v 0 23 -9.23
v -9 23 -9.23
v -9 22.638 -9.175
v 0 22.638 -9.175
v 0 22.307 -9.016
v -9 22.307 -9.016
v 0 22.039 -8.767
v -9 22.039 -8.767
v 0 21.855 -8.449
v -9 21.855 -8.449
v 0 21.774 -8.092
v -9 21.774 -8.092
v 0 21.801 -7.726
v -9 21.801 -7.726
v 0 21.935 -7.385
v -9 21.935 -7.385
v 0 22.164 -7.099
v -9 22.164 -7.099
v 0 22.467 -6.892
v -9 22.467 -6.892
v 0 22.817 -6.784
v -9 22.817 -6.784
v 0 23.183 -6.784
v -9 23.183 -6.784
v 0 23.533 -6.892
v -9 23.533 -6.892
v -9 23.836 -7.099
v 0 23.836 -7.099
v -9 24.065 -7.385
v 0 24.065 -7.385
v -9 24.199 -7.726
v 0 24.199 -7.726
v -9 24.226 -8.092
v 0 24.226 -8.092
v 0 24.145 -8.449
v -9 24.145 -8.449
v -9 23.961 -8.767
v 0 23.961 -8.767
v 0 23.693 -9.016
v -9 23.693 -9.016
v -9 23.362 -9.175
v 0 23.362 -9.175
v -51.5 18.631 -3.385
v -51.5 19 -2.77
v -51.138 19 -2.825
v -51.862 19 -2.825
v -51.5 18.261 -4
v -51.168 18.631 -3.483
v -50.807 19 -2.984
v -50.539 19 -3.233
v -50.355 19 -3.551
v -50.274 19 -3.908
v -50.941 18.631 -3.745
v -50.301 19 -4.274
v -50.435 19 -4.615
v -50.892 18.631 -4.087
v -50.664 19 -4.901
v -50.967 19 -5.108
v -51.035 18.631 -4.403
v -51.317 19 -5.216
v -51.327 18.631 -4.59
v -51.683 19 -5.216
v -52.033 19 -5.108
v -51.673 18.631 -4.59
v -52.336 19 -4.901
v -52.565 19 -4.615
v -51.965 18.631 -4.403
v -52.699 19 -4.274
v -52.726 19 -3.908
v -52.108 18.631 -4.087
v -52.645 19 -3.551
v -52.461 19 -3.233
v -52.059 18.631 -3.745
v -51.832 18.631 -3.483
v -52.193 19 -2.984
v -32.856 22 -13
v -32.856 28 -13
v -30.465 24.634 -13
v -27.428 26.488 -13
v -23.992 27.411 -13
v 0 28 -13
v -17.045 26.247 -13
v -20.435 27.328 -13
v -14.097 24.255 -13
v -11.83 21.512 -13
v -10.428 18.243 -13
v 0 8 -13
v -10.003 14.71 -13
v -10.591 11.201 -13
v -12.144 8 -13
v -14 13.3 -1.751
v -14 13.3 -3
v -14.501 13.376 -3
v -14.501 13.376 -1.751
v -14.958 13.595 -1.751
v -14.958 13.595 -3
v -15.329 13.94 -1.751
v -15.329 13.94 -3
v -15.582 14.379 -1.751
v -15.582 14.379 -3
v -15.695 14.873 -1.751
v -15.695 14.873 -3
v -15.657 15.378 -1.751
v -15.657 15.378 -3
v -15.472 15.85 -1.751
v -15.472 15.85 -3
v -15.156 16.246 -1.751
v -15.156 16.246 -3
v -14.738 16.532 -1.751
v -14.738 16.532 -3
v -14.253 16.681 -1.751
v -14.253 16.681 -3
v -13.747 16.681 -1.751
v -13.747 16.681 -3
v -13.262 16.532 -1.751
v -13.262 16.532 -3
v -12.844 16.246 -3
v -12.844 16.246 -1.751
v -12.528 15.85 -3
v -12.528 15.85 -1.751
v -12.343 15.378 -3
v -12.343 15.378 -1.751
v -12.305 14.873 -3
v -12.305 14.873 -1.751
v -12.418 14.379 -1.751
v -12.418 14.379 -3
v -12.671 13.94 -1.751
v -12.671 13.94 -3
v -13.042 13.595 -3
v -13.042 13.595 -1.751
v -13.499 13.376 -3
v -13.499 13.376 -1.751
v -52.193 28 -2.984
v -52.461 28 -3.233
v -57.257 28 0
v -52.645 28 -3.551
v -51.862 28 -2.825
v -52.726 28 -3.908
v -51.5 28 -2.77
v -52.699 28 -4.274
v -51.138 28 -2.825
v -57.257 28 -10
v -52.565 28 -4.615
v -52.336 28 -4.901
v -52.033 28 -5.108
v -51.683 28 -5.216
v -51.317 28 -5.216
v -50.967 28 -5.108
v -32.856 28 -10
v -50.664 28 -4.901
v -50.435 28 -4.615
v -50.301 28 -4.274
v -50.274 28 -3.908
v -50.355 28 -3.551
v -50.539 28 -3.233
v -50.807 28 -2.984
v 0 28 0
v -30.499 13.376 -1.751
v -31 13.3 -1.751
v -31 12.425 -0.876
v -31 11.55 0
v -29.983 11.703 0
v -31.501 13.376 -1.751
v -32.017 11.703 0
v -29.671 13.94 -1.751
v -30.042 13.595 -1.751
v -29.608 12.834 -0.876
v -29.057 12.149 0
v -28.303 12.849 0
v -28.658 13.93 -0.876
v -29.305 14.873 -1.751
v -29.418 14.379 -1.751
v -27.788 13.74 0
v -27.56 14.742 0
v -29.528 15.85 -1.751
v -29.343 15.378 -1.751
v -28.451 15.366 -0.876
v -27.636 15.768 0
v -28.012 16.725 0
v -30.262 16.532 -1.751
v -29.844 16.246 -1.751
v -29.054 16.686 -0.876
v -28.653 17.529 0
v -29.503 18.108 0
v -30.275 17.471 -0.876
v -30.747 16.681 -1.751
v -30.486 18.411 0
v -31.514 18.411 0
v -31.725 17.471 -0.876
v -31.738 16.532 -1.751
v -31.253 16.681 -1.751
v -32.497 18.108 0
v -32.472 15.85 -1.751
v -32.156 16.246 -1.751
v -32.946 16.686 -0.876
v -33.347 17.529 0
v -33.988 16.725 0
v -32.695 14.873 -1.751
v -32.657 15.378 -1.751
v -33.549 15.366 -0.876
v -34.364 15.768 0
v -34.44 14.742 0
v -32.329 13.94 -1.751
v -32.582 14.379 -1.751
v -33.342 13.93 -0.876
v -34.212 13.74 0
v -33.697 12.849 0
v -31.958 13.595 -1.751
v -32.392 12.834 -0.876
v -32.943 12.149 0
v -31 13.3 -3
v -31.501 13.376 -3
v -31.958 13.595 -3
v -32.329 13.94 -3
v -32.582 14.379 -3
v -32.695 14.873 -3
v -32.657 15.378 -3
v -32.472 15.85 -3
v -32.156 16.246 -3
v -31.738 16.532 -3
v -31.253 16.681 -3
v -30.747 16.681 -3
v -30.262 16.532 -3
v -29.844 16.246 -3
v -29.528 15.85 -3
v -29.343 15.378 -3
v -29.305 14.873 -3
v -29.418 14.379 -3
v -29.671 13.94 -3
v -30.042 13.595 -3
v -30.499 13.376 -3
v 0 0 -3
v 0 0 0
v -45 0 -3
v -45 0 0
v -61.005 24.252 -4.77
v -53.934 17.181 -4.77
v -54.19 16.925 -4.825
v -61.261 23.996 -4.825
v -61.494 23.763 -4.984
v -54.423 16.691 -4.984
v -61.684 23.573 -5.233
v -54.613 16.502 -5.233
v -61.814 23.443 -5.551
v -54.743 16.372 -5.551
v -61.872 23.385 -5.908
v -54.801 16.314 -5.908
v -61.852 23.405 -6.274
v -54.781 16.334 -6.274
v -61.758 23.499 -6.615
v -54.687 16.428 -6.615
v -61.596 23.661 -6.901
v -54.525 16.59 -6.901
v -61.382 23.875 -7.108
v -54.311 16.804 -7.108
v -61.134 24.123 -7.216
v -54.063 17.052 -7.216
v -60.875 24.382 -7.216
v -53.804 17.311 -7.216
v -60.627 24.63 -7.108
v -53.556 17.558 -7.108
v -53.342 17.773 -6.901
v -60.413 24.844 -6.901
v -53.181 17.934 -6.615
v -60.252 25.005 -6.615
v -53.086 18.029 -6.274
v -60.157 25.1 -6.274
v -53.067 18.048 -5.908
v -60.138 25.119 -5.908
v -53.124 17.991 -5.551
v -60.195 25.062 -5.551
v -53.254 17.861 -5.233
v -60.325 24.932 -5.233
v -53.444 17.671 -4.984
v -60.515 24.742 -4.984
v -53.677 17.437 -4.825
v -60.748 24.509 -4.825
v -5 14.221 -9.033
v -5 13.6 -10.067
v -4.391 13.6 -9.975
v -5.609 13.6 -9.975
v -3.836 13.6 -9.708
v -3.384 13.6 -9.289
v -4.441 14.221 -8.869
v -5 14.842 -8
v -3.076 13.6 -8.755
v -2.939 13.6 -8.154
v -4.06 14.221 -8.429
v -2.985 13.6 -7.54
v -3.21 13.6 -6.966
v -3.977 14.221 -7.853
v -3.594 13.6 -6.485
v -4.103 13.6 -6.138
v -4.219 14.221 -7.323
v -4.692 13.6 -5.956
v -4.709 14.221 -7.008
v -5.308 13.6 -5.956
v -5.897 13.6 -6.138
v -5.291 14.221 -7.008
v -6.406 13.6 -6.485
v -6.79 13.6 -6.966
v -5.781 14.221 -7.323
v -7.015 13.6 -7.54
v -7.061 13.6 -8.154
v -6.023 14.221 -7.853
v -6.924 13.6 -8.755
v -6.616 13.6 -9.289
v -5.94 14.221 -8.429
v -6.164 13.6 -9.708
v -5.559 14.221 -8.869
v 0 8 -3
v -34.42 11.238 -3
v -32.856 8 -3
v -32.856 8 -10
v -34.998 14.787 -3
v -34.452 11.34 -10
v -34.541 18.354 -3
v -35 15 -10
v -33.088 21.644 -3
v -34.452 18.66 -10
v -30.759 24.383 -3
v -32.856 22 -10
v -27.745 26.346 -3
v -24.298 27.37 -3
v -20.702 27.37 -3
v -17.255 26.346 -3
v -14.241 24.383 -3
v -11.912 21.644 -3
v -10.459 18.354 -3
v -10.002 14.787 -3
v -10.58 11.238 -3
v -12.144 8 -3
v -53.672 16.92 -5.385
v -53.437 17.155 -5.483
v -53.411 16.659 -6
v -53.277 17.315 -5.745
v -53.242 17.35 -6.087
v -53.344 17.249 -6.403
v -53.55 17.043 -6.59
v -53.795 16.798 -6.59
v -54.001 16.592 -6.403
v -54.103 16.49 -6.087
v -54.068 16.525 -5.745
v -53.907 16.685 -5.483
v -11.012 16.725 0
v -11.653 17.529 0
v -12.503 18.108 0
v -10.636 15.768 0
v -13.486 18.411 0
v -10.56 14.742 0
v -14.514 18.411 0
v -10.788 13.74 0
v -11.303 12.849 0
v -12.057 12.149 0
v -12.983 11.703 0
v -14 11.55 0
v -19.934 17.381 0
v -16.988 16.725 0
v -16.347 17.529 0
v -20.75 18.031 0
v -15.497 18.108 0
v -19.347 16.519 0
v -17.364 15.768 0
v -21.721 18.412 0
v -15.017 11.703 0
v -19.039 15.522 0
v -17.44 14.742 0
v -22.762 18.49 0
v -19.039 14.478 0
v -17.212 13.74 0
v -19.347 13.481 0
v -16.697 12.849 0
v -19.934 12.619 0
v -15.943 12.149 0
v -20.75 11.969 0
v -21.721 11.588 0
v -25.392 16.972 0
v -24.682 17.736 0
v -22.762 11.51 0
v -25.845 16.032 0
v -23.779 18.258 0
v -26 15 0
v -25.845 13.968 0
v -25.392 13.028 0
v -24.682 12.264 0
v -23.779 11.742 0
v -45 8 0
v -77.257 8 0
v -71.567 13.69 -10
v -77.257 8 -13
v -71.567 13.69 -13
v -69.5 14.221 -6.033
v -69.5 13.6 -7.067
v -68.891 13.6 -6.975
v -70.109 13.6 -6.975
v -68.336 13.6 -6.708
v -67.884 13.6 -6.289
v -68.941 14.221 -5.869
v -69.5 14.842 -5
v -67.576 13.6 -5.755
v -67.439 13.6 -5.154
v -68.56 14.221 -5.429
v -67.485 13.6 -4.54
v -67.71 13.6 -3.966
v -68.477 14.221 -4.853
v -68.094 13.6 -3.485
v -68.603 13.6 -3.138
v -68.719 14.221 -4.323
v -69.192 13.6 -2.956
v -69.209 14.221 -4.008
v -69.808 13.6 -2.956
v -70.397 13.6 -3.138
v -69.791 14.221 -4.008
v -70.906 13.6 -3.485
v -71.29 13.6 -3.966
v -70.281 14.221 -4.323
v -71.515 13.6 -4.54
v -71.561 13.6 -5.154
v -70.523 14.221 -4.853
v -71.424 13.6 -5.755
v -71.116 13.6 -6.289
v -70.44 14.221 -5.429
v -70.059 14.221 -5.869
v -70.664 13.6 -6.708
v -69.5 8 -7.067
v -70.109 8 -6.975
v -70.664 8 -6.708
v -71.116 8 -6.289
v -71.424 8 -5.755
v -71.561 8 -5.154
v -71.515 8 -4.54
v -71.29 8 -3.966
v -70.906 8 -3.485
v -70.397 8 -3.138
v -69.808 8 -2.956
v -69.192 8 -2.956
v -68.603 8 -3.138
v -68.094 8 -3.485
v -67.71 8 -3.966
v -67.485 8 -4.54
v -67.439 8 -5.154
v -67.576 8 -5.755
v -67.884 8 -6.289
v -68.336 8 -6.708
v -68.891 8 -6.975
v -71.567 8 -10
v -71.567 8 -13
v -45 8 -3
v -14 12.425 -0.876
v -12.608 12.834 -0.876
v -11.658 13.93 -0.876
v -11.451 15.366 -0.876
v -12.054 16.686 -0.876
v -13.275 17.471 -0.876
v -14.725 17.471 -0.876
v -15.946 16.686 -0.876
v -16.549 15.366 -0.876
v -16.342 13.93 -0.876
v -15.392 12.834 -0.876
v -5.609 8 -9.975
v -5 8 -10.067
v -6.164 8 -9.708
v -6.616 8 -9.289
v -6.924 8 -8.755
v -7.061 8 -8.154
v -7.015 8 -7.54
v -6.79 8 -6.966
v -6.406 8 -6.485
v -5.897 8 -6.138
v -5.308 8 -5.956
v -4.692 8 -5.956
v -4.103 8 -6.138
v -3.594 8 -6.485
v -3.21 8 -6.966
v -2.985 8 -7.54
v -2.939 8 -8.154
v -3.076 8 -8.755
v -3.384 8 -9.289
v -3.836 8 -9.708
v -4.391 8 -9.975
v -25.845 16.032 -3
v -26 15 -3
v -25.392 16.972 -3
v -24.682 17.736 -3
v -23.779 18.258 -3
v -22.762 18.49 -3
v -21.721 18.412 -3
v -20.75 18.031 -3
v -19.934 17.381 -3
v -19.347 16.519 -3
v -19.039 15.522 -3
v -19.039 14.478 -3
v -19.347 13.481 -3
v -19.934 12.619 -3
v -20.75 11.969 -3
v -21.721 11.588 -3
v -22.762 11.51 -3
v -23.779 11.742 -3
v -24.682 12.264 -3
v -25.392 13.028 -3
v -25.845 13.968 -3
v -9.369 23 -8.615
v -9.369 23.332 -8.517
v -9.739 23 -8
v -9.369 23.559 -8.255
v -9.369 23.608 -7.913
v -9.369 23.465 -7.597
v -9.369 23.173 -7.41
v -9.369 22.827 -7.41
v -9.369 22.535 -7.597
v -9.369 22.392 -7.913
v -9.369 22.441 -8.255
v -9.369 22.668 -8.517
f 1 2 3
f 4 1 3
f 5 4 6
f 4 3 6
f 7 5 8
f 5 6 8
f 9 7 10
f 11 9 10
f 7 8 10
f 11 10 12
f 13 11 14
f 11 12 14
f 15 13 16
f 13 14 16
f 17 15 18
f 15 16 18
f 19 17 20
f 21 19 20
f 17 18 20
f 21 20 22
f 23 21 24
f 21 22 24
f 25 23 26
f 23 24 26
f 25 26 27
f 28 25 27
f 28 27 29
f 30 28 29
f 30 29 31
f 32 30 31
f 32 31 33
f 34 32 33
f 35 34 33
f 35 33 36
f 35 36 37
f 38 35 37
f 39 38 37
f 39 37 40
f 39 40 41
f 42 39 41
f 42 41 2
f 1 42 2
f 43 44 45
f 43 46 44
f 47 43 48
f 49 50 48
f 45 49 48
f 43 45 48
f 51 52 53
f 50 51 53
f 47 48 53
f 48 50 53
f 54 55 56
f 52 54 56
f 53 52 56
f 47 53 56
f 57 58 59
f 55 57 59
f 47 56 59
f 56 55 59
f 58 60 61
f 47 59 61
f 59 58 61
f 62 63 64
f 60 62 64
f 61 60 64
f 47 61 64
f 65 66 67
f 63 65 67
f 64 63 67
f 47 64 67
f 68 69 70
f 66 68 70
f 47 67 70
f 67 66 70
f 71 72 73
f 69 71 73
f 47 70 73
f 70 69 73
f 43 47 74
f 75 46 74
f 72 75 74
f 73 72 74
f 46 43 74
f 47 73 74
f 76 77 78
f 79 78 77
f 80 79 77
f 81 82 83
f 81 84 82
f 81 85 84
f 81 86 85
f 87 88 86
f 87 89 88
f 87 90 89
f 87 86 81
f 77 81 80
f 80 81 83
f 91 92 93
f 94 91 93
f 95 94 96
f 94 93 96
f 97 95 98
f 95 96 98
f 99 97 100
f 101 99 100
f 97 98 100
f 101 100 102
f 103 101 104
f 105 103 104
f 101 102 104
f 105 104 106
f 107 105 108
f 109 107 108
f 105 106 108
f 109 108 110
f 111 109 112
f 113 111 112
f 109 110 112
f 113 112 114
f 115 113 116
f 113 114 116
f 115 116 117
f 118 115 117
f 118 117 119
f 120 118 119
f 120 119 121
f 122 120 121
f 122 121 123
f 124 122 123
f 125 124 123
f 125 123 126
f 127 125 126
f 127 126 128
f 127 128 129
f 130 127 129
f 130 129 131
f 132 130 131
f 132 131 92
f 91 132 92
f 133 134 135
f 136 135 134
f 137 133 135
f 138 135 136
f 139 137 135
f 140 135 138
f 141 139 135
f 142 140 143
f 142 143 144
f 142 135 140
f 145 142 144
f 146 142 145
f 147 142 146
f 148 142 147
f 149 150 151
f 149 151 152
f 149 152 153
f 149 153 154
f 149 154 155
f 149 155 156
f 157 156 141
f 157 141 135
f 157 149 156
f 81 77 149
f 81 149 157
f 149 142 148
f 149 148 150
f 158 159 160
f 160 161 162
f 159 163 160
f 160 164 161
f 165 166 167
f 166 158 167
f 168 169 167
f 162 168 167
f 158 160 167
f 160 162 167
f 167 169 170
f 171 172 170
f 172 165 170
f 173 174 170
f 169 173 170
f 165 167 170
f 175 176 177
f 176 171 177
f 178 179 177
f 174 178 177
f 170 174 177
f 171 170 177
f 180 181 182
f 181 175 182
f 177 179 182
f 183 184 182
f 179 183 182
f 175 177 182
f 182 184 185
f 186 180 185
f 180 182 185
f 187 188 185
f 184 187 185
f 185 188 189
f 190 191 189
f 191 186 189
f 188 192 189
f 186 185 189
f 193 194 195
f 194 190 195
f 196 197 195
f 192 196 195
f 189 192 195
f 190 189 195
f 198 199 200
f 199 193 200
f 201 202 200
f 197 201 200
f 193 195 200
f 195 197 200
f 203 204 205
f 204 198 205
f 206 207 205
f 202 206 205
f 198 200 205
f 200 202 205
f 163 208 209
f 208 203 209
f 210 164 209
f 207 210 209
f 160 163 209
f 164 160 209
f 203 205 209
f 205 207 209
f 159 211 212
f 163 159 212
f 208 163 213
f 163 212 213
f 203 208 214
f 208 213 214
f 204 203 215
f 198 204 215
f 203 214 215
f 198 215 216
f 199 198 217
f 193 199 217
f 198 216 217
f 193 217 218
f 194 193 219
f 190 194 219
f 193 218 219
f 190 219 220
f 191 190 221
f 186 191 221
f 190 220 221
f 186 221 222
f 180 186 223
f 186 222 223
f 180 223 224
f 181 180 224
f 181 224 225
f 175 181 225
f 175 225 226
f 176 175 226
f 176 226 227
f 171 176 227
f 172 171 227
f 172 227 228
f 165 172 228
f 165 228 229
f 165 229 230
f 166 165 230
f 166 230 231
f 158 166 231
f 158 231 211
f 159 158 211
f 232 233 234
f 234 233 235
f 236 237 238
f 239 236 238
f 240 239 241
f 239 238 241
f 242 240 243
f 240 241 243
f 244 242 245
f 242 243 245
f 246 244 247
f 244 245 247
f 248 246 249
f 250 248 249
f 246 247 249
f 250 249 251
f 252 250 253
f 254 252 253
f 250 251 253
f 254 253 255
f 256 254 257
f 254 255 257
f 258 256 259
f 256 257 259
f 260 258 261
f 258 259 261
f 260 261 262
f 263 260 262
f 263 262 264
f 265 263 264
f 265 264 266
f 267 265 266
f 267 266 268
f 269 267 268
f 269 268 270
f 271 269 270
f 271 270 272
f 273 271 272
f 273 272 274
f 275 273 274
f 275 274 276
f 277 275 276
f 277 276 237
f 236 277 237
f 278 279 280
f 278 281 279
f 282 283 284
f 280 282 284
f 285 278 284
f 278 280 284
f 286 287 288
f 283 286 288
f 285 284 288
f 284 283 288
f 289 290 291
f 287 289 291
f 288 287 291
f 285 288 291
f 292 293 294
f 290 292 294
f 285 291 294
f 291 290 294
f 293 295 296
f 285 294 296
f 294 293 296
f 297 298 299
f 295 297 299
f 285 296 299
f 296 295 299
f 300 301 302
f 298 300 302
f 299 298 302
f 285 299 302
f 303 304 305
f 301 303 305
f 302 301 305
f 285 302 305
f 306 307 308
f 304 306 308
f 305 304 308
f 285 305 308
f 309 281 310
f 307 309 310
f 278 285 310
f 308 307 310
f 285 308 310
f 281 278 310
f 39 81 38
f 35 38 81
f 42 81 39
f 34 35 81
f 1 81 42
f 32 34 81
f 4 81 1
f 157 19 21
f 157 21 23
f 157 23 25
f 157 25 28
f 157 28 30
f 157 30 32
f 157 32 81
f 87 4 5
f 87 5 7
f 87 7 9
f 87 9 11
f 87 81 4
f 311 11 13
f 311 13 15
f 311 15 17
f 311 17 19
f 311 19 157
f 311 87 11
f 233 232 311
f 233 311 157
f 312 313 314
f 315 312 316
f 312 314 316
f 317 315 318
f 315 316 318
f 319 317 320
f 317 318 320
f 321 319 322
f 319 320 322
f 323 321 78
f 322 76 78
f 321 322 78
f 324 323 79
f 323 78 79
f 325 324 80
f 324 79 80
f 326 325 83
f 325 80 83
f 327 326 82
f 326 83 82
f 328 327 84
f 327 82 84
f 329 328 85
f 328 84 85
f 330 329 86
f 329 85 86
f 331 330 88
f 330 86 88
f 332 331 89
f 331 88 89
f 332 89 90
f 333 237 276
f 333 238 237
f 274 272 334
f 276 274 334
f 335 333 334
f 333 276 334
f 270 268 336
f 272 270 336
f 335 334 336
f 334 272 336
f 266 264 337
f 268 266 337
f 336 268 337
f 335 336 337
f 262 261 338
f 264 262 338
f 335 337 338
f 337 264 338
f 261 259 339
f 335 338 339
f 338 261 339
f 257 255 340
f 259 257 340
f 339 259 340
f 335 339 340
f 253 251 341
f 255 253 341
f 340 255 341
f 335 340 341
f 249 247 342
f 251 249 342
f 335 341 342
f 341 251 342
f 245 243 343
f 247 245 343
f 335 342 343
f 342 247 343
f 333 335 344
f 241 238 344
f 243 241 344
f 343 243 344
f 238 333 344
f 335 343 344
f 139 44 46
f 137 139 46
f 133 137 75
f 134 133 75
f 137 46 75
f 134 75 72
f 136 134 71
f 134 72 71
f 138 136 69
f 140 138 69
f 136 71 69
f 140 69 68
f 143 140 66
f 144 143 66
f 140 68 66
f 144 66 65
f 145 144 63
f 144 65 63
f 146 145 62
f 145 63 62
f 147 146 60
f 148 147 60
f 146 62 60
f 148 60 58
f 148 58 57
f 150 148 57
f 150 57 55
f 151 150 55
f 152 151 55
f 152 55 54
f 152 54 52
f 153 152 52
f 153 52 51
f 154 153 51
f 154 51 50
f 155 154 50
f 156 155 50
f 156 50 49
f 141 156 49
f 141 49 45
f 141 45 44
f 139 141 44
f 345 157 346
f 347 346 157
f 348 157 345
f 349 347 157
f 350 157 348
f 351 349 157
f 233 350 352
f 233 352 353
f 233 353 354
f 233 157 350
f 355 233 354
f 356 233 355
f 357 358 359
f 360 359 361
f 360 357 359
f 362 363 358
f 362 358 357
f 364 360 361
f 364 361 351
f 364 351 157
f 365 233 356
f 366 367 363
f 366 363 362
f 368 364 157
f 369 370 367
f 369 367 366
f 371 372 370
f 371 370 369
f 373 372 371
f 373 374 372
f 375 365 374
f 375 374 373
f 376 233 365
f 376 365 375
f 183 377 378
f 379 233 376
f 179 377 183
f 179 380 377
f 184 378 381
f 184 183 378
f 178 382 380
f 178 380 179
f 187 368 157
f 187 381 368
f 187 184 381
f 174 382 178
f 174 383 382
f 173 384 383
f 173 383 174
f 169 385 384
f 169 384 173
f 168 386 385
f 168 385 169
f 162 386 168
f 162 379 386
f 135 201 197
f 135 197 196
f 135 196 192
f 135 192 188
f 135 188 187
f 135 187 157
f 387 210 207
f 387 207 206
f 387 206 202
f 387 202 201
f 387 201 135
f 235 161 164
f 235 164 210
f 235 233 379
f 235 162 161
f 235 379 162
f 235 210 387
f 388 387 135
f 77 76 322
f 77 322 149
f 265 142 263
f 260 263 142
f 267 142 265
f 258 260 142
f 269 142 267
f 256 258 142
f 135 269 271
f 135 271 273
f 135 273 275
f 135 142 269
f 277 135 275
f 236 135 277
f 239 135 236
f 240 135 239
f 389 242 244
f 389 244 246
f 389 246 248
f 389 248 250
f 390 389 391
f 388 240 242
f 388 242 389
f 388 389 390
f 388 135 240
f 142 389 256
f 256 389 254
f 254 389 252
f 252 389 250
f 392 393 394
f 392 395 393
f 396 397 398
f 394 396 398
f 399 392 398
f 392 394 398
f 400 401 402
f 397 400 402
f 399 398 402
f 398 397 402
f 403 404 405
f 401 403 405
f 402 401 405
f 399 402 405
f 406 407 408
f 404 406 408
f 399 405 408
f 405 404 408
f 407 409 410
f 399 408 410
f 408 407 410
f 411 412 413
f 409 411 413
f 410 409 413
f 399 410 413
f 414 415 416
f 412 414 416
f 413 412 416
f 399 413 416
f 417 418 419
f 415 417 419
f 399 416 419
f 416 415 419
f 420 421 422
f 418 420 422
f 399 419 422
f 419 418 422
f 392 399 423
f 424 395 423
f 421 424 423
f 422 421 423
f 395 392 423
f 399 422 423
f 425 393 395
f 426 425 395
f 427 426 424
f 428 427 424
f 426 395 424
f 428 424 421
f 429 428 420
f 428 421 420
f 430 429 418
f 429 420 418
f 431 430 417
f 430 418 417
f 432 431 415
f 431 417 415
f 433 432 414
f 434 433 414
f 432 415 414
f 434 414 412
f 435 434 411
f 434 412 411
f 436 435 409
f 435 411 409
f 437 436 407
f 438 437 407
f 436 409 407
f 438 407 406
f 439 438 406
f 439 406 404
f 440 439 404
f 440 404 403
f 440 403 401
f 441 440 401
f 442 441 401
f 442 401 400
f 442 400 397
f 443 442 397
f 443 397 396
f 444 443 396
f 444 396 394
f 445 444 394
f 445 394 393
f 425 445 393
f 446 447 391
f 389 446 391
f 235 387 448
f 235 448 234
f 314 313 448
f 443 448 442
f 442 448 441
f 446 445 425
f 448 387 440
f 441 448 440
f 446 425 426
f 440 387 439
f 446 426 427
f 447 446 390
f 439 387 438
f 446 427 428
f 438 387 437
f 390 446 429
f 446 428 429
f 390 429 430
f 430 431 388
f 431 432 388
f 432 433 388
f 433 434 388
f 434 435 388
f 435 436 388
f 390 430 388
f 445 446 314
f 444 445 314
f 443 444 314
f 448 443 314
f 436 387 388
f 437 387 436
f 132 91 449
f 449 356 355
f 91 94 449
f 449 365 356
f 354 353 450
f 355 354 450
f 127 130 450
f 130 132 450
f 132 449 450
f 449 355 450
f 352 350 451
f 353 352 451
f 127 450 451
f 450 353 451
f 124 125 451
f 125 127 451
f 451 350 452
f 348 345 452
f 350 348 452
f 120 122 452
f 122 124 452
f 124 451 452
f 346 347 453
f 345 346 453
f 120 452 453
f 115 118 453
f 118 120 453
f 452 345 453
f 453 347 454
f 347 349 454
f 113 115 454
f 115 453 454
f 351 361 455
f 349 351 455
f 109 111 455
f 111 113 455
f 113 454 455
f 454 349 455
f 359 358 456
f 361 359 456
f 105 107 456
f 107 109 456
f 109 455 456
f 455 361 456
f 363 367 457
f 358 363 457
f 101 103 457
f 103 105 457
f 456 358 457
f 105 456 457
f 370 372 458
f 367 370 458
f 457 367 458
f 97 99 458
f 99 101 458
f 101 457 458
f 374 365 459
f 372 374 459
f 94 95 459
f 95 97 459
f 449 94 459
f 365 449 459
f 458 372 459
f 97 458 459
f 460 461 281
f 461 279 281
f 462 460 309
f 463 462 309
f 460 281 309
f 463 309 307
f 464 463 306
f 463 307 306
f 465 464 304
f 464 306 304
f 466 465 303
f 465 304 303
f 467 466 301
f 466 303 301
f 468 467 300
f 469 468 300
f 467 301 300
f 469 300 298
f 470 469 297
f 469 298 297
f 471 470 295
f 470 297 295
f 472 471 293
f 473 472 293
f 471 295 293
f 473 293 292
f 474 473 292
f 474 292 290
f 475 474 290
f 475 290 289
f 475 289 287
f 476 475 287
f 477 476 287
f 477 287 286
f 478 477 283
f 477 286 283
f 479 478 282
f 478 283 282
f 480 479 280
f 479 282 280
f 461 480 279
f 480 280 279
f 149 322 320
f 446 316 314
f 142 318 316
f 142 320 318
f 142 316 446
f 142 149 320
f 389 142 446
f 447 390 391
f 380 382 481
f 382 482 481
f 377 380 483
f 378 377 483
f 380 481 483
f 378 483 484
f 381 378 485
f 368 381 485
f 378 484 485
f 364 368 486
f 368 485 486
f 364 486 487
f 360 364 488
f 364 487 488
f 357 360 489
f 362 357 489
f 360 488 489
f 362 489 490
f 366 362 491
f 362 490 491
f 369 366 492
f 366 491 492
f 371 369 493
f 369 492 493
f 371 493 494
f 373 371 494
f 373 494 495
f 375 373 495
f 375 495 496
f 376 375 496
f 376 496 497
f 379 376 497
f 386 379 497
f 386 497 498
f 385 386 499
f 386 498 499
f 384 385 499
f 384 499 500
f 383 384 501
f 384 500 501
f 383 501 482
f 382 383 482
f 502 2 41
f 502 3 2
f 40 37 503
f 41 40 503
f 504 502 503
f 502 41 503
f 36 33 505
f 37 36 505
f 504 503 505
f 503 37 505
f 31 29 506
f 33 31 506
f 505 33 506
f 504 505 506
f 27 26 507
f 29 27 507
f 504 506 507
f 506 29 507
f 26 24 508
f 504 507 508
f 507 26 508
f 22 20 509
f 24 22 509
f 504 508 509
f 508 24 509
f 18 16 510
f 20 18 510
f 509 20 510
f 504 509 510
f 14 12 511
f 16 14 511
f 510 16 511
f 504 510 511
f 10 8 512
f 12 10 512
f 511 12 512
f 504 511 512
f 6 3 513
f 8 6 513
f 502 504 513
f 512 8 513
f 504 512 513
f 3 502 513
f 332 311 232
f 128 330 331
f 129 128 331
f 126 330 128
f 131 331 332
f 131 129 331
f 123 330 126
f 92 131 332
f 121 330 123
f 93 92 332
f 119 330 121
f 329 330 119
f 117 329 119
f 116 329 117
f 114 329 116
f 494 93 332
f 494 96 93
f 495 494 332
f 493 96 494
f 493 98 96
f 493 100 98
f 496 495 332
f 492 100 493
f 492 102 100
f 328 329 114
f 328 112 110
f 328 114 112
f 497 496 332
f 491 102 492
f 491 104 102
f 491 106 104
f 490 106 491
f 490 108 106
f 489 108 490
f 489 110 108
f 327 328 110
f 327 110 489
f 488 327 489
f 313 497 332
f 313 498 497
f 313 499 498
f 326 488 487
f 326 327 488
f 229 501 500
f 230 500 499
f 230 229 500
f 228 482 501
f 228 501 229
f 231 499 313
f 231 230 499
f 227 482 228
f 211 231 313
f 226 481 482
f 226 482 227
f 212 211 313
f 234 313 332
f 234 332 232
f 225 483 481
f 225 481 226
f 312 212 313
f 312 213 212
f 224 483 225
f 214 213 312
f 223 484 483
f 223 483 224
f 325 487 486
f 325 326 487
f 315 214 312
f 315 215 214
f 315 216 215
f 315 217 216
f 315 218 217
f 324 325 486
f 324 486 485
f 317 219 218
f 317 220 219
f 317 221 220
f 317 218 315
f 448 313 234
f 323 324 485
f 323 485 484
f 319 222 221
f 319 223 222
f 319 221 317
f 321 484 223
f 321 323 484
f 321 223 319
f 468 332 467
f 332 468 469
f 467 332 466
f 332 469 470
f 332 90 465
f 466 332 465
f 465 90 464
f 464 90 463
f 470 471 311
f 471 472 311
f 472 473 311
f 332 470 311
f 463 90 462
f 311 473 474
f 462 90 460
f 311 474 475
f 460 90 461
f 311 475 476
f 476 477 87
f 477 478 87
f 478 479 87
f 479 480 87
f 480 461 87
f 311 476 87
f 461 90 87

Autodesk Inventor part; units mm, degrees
ref_plane "YZ Plane" through (0, 0, 0) normal (1, 0, 0) x (0, 1, 0)
ref_plane "XZ Plane" through (0, 0, 0) normal (0, 1, 0) x (-1, 0, 0)
ref_plane "XY Plane" through (0, 0, 0) normal (0, 0, 1) x (1, 0, 0)
sketch "Sketch1" plane through (0, 0, 0) normal (0, 1, 0) x (-1, 0, 0)
  line L0 (0, 0) -> (81.5, 0)
  line L1 (81.5, 0) -> (81.5, -13)
  line L2 (81.5, -13) -> (0, -13)
  line L3 (0, -13) -> (0, 0)
  dimension "d0" = 81.5
  dimension "d1" = 13
extrude "Extrusion1" add sketch "Sketch1" along normal blind 30
sketch "Sketch2" plane through (0, 0, -13) normal (0, 0, -1) x (-1, 0, 0)
  line L0 (0, 0) -> (0, 30) projected
  line L1 (0, 0) -> (81.5086, 0)
  line L2 (81.5086, 0) -> (81.5086, 8)
  line L3 (81.5086, 8) -> (0, 8)
  line L4 (0, 8) -> (0, 0)
  line L5 (81.5, 0) -> (81.5, 30) projected
  line L6 (81.5, 0) -> (22.5, 0)
  line L7 (0, 0) -> (81.5, 0) projected
  line L8 (22.5, 0) -> (22.5, 15)
  circle A0 centre (22.5, 15) radius 12.5
  dimension "d4" = 81.5086
  dimension "d5" = 8
  dimension "d6" = 59
  dimension "d7" = 15
  dimension "d8" = 25
extrude "Extrusion2" cut sketch "Sketch2" against normal blind 10
sketch "Sketch3" plane through (-81.5, 0, 0) normal (0, 0, 1) x (1, 0, 0)
  line L0 (0, 8) -> (0, 30) projected
  line L1 (0, 30) -> (0, 8)
  line L2 (0, 30) -> (22, 30)
  line L3 (0, 30) -> (81.5, 30) projected
  line L4 (22, 30) -> (0, 8)
  line L5 (81.5, 0) -> (81.5, 8) projected
  line L6 (81.5, 0) -> (36.5, 0)
  line L7 (0, 0) -> (81.5, 0) projected
  line L8 (48.6438, 8) -> (0, 8) projected
  line L9 (36.5, 0) -> (0, 0)
  line L10 (0, 0) -> (0, 8)
  line L11 (0, 8) -> (36.5, 8)
  line L12 (36.5, 8) -> (36.5, 0)
  dimension "d11" = 22
  dimension "d12" = 45
extrude "Extrusion3" cut sketch "Sketch3" against normal blind 13
sketch "Sketch4" plane through (0, 30, 0) normal (0, 1, 0) x (1, 0, 0)
  line L0 (0, 0) -> (0, 13) projected
  line L1 (-59.5, 0) -> (-81.5, 0) projected
  line L2 (0, 13) -> (-81.5, 13)
  line L3 (-81.5, 13) -> (-81.5, 0)
  line L4 (-81.5, 0) -> (0, 0)
  line L5 (0, 0) -> (0, 13)
extrude "Extrusion4" cut sketch "Sketch4" against normal blind 2
sketch "Sketch6" plane through (0, 0, -3) normal (0, 0, -1) x (-1, 0, 0)
  arc A0 (32.8562, 8) -> (12.1438, 8) centre (22.5, 15) ccw projected
  circle A1 centre (22.5, 15) radius 3.5
  point P0 (0, 0)
  dimension "d17" = 7
extrude "Extrusion5" cut sketch "Sketch6" against normal blind 3
sketch "Sketch7" plane through (-45, 0, 0) normal (0, 0, 1) x (1, 0, 0)
  circle A0 centre (22.5, 15) radius 3.5 projected
  line L0 (22.5, 15) -> (31, 15)
  line L1 (22.5, 15) -> (14, 15)
  point P0 (45, 0)
  dimension "d20" = 8.5
  dimension "d21" = 8.5
hole "Hole1" at (-14, 15, 0) at (-31, 15, 0) direction (0, 0, -1) diameter 3.4 end through all countersink diameter 6.9 countersink angle 89.954 clearance for "Countersunk Flat Head Screw ISO 2009/7046" size "M3" standard "ISO"
sketch "Sketch8" plane through (-32.8562, 8, -13) normal (0, -1, 0) x (1, 0, 0)
  line L0 (0, 0) -> (-48.6438, 0) projected
  line L1 (-48.6438, 0) -> (-36.6438, 0)
  line L2 (-36.6438, 0) -> (-36.6438, 8)
  line L3 (32.8562, 10) -> (32.8562, 0) projected
  line L4 (32.8562, 0) -> (32.8562, 5)
  line L5 (32.8562, 5) -> (27.8562, 5)
  point P0 (32.8562, 13)
  dimension "d82" = 8
  dimension "d83" = 5
  dimension "d84" = 5
hole "Hole2" at (-5, 8, -8) at (-69.5, 8, -5) direction (0, 1, 0) diameter 4.134 depth 5.6 tip angle 118 thread size "M5x0.8" class "6H" standard "ISO Metric profile"
sketch "Sketch9" plane through (0, 0, 0) normal (1, 0, 0) x (0, 0, -1)
  line L0 (8, 28) -> (8, 23)
  line L1 (0, 28) -> (13, 28) projected
  line L2 (8, 28) -> (13, 28)
  point P0 (0, 0)
  point P1 (13, 8)
  dimension "d40" = 5
hole "Hole3" at (0, 23, -8) direction (-1, 0, 0) diameter 2.459 depth 9 tip angle 118 thread size "M3x0.5" class "6H" standard "ISO Metric profile"
sketch "Sketch10" plane through (0, 28, 0) normal (0, 1, 0) x (1, 0, 0)
  line L0 (-61.5, 0) -> (-61.5, 13) projected
  line L1 (-61.5, 0) -> (-61.5, 4)
  line L2 (-61.5, 4) -> (-51.5, 4)
  point P0 (0, 0)
  dimension "d76" = 4
  dimension "d77" = 10
hole "Hole4" at (-51.5, 28, -4) direction (0, -1, 0) diameter 2.459 depth 9 tip angle 118 thread size "M3x0.5" class "6H" standard "ISO Metric profile"
sketch "Sketch12" plane through (-45, 0, 0) normal (0, 0, 1) x (1, 0, 0)
  line L0 (12.1438, 8) -> (-36.5, 8) projected
  line L1 (-36.5, 8) -> (-33.5, 8)
  line L2 (-16.5, 28) -> (45, 28) projected
  line L3 (-16.5, 28) -> (-13.5, 28)
  line L4 (-13.5, 28) -> (-33.5, 8)
  line L5 (-36.5, 8) -> (-16.5, 28)
  line L6 (-13.5, 28) -> (-12.257, 28)
  line L7 (45, 28) -> (-16.5, 28) projected
  line L8 (-12.257, 28) -> (-32.257, 8)
  line L9 (-33.5, 8) -> (-32.257, 8)
  point P0 (45, 0)
  dimension "d71" = 3
  dimension "d72" = 3
  dimension "d75" = 1.243
extrude "Extrusion6" cut sketch "Sketch12" against normal blind 25.4
sketch "Sketch13" plane through (-22.5, 15, -13) normal (0, 0, -1) x (-1, 0, 0)
  line L0 (10.3562, -7) -> (54.757, -7) projected
  line L1 (10.3562, -7) -> (47.3562, -7)
  line L2 (47.3562, -7) -> (47.3562, 0.4008)
  line L3 (34.757, 13) -> (54.757, -7) projected
  line L4 (34.757, 13) -> (-22.5, 13) projected
  line L5 (47.3562, 0.4008) -> (34.757, 13)
  line L6 (34.757, 13) -> (10.3562, 13)
  arc A0 (10.3562, -7) -> (-10.3562, -7) centre (0, 0) ccw projected
  line L7 (10.3562, -7) -> (10.3562, 13)
  line L8 (49.067, -7) -> (44.933, -7) projected
  line L9 (47.3562, -7) -> (49.067, -7)
  line L10 (49.067, -7) -> (49.067, -1.31)
  line L11 (47.3562, 0.4008) -> (49.067, -1.31)
  line L12 (54.757, -7) -> (34.757, 13) projected
  point P0 (-22.5, -15)
  dimension "d79" = 37
extrude "Extrusion7" cut sketch "Sketch13" against normal blind 3 contours A0 L7 L4 L3 L2 L0 | L7 A0 | L2 L3 L10 L0
sketch "Sketch11" plane through (-79.3785, 5.8785, -13) normal (-0.7071068, 0.7071068, 0) x (-0.7071068, -0.7071068, 0)
  line L0 (-31.2845, 3) -> (-31.2845, 13) projected
  line L1 (-3.0003, 0) -> (-11.0471, 0) projected
  point P0 (-51.9723, 13)
  point P1 (-25.9845, 7)
  dimension "d111" = 5.3
  dimension "d112" = 7
hole "Hole5" at (-61.0047, 24.2523, -6) direction (0.7071068, -0.7071068, 0) diameter 2.459 depth 10 tip angle 118 thread size "M3x0.5" class "6H" standard "ISO Metric profile"
properties part number "mocowanie_silnika_wariant1"
